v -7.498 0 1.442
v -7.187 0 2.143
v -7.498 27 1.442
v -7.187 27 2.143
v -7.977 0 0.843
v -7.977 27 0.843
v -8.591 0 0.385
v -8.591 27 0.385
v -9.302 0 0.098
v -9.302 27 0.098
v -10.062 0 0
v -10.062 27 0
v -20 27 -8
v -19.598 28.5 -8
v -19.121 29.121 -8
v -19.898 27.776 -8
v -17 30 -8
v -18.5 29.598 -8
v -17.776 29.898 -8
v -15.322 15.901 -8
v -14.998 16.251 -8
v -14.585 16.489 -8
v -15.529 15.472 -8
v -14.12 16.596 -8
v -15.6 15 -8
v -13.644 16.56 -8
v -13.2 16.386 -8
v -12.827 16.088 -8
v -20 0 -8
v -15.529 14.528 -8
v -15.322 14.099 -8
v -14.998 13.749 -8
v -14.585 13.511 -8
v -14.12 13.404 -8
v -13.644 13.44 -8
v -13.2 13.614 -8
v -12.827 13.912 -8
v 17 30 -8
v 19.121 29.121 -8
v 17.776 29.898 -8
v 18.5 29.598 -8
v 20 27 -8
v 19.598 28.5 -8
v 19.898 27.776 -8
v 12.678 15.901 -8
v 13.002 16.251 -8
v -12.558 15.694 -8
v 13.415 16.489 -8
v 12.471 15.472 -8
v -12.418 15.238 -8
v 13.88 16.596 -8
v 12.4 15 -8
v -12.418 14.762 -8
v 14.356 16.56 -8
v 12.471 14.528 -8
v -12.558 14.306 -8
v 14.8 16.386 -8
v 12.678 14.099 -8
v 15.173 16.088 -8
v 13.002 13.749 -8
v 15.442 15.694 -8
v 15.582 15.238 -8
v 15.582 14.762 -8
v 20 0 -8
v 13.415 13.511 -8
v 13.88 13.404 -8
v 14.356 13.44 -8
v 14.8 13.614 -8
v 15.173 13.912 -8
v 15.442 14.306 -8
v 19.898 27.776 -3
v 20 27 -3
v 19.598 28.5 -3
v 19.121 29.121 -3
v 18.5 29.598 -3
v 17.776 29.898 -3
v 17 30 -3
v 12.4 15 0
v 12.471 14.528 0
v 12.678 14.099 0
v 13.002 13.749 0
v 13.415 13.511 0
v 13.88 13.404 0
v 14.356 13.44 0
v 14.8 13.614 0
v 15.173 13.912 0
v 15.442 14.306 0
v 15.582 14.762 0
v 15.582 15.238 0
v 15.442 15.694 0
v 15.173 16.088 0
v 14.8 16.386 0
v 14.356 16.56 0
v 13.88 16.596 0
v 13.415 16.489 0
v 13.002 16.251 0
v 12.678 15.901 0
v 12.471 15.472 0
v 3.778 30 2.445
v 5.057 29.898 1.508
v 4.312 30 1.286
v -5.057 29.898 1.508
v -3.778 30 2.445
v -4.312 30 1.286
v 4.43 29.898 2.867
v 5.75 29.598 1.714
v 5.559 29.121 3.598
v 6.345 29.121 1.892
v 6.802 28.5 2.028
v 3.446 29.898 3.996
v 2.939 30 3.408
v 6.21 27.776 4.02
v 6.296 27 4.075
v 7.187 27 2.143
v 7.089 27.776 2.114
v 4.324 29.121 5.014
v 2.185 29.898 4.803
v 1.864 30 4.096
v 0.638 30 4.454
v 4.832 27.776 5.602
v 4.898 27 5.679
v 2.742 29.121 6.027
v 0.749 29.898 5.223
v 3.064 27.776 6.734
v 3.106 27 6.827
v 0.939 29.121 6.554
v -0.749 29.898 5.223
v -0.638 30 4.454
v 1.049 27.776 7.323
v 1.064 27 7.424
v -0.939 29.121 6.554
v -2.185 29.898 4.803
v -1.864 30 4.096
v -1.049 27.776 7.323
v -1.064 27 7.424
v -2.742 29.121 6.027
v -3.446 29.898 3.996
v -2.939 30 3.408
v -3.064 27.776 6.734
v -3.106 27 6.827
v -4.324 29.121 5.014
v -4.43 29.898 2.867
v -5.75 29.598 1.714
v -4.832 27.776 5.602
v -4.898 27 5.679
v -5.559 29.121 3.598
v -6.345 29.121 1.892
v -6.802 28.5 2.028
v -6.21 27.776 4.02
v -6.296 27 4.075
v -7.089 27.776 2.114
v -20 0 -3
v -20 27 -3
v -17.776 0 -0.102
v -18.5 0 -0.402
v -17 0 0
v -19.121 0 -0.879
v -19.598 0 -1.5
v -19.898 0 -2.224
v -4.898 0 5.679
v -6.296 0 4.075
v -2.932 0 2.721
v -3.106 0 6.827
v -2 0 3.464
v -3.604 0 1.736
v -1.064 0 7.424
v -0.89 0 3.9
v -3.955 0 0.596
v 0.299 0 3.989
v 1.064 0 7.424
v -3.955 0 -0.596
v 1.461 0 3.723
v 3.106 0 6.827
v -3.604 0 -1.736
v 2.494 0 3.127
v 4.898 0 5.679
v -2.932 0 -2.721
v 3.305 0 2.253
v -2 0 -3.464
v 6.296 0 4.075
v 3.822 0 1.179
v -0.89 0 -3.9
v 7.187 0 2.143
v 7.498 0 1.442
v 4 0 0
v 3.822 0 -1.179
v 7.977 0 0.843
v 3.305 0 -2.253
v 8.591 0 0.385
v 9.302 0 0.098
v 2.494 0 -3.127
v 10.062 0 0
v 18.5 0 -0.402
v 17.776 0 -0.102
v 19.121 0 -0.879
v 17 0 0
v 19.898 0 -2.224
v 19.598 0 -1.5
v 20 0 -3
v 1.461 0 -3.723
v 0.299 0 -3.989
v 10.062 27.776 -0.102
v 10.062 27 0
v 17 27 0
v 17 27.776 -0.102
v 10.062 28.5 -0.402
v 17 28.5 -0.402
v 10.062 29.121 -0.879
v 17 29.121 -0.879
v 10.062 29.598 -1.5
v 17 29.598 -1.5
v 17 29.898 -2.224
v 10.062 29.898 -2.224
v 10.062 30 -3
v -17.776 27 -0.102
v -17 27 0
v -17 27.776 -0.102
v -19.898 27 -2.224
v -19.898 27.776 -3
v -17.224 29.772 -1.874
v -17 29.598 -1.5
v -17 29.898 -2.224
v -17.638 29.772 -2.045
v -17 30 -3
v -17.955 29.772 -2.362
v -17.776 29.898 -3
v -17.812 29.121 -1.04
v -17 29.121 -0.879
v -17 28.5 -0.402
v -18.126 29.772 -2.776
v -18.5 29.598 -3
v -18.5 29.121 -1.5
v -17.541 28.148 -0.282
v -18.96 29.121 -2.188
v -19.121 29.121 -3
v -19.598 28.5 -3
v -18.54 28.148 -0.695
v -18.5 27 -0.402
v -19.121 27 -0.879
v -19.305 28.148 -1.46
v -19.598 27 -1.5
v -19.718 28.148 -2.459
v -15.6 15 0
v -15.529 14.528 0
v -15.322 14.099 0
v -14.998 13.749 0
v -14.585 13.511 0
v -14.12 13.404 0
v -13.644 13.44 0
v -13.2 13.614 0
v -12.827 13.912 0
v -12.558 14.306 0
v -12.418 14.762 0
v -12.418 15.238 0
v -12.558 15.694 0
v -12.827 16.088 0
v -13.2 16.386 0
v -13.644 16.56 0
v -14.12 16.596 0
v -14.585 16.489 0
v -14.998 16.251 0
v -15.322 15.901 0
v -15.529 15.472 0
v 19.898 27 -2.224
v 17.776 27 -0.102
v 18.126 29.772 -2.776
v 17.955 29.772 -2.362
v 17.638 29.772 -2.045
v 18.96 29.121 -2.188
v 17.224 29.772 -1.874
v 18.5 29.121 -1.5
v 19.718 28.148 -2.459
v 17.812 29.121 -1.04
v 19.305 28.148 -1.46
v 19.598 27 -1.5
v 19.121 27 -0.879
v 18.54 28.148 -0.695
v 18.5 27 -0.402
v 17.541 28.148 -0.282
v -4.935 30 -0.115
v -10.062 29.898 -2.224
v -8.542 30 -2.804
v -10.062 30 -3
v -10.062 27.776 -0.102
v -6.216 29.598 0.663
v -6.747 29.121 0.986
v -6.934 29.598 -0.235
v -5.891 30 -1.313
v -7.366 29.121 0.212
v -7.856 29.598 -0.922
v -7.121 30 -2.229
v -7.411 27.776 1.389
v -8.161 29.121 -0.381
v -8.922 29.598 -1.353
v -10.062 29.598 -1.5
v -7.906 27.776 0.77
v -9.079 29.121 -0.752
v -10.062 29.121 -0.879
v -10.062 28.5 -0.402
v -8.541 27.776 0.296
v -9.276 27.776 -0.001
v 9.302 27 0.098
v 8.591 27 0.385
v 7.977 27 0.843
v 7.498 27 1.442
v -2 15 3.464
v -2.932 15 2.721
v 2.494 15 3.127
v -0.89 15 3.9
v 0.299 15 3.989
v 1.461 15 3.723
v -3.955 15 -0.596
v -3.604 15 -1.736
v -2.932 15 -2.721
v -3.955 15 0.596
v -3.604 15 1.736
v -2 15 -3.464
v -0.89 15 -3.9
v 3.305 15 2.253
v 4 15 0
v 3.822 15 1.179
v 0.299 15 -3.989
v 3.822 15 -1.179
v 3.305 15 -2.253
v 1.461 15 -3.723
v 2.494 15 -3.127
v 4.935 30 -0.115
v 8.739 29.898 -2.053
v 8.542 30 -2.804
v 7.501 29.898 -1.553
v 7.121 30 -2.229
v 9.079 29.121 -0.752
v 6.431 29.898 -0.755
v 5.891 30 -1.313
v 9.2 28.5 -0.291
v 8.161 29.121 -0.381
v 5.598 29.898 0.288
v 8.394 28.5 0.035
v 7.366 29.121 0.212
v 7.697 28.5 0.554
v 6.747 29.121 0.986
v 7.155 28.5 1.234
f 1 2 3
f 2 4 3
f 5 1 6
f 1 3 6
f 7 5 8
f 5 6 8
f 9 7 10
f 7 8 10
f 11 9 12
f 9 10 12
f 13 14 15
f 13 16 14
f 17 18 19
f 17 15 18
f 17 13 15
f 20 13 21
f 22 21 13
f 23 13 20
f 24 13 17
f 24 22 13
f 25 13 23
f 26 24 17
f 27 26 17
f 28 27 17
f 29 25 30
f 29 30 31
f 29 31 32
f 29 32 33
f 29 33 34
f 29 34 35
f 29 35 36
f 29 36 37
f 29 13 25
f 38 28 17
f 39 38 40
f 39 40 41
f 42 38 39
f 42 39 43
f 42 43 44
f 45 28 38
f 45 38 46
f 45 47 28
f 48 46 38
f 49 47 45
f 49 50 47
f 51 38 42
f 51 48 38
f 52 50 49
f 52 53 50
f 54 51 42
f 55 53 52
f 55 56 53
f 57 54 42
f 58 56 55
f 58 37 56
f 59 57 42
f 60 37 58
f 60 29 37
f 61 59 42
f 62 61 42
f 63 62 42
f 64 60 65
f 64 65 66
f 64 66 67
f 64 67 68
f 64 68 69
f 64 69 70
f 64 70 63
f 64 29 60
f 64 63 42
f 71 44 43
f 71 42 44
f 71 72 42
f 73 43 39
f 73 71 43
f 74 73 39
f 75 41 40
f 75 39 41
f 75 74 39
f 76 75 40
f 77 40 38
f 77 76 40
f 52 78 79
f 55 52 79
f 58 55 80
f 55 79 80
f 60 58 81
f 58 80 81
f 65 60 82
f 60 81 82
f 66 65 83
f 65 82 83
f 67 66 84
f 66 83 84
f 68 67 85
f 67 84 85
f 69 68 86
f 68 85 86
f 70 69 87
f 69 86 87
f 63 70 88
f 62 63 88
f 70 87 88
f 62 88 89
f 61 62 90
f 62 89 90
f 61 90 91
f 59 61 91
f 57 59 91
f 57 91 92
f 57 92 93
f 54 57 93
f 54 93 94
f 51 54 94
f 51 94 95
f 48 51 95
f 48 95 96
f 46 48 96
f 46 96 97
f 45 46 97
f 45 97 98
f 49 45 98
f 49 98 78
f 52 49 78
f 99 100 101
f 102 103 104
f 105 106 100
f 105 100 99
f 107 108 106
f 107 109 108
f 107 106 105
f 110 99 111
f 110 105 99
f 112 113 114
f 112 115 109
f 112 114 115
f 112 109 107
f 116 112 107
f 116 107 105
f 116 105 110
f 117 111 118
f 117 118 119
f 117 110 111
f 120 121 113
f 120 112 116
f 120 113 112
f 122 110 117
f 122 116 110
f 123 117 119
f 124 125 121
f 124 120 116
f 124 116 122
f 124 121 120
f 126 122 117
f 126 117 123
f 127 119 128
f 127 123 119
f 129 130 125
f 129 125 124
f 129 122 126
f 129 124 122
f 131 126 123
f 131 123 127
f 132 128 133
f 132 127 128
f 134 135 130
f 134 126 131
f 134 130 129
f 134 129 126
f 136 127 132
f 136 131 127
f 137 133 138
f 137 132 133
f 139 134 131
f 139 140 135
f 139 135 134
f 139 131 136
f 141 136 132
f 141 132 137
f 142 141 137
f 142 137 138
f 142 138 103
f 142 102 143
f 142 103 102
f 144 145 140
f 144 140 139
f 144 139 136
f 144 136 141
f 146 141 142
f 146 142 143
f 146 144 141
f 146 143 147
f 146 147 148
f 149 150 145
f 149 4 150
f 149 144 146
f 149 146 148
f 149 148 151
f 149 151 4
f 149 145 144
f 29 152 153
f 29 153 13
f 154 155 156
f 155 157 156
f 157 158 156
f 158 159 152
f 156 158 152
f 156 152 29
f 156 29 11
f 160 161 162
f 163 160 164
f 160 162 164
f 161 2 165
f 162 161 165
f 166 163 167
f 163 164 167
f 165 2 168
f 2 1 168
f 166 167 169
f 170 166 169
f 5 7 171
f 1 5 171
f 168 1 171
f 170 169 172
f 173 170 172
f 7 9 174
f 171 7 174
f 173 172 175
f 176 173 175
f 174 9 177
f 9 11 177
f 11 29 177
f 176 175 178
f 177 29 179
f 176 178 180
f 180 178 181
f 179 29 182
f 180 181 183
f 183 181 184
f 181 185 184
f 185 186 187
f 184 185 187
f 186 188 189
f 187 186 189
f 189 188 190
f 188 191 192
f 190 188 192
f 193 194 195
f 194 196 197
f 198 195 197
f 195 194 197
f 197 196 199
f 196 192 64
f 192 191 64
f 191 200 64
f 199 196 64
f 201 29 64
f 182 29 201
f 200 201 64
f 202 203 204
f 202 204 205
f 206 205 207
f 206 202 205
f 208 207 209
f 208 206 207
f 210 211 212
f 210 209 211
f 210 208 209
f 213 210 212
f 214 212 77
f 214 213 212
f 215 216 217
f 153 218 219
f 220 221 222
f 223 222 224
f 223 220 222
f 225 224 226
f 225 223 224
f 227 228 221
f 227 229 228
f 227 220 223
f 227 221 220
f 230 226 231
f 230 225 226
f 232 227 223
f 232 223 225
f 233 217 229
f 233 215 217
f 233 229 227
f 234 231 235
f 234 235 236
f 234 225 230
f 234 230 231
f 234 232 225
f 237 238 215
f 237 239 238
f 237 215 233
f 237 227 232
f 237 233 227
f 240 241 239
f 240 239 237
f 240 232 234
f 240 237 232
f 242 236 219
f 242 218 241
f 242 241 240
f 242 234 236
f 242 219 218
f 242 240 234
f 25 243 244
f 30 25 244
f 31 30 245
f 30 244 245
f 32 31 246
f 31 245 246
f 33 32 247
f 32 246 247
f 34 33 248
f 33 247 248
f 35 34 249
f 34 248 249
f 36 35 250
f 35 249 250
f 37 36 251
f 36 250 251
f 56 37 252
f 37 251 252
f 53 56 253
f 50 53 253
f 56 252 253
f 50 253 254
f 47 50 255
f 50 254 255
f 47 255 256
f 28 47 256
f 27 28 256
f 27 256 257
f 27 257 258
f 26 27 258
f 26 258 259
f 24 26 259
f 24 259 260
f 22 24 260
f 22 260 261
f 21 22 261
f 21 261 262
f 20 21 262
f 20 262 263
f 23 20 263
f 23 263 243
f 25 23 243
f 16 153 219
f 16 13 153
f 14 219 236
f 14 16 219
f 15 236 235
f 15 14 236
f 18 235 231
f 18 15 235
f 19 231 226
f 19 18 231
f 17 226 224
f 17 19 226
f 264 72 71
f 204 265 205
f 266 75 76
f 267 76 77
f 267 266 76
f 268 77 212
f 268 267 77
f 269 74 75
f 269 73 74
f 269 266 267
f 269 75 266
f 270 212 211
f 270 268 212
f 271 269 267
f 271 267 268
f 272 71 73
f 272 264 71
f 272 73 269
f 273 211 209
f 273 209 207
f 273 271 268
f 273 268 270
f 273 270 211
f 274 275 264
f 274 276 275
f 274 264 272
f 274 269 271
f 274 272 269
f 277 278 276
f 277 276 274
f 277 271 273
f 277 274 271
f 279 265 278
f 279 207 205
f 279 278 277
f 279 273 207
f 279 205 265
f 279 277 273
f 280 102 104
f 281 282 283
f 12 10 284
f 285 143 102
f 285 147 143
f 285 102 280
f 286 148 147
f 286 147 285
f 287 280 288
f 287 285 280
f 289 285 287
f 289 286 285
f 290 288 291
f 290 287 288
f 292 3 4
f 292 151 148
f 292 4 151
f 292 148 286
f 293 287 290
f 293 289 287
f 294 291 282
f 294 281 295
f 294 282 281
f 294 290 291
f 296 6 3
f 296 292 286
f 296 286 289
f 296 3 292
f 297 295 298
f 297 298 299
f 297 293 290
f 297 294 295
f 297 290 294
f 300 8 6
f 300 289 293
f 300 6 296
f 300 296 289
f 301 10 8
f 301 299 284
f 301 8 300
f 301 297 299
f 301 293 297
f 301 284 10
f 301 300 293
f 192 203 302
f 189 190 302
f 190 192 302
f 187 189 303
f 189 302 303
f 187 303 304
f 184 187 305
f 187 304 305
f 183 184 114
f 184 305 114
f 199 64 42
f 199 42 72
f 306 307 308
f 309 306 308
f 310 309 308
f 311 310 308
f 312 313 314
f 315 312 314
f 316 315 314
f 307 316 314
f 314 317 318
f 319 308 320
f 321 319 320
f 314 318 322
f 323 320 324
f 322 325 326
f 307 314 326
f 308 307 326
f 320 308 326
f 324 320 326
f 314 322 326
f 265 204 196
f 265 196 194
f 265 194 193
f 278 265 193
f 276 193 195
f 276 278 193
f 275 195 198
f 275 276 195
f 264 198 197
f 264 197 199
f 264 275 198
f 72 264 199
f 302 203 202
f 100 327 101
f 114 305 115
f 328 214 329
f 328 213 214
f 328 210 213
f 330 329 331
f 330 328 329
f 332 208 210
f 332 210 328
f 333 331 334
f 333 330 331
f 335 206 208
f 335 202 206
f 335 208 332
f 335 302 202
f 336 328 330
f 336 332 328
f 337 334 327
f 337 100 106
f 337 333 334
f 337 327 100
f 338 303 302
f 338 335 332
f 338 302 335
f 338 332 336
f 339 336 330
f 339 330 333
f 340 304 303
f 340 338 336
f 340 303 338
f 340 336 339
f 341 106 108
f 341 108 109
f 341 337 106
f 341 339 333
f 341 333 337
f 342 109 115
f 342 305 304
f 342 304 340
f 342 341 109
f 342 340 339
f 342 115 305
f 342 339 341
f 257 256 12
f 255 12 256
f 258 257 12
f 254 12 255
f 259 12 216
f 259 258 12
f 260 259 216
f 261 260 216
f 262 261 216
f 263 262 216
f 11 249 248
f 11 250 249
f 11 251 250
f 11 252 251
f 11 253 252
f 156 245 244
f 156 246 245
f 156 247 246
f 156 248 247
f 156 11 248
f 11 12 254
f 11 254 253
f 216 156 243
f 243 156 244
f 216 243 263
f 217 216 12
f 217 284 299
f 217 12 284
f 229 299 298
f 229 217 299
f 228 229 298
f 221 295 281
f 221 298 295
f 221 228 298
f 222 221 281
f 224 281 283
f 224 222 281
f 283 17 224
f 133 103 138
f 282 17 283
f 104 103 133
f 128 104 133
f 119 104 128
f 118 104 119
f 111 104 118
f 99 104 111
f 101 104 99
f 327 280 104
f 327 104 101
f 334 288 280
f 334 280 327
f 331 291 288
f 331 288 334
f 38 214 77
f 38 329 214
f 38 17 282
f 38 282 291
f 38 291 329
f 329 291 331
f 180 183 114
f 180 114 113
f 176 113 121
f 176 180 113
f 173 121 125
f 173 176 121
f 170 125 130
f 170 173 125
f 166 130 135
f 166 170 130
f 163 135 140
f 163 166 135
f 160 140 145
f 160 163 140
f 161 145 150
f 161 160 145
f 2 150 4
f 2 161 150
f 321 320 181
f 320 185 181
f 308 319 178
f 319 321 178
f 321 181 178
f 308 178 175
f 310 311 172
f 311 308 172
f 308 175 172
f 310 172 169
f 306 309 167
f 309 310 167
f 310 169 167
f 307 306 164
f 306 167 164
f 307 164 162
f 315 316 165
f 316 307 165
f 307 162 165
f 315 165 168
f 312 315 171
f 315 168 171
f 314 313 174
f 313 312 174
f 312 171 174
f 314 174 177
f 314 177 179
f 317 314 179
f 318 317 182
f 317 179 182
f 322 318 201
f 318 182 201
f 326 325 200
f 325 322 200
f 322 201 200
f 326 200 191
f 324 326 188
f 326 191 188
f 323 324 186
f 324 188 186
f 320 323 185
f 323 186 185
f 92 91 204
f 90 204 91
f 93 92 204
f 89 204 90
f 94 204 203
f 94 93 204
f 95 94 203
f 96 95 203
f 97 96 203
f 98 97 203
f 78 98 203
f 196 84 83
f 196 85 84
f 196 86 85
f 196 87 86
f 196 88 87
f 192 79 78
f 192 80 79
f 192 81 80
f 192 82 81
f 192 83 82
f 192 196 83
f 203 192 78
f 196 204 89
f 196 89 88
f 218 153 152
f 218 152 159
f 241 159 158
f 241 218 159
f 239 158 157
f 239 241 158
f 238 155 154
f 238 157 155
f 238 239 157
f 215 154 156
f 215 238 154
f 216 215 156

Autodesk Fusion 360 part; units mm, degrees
sketch "Sketch1" plane through (0, 0, 0) normal (0, 1, 0) x (1, 0, 0)
  line L0 (-7.5, 0) -> (-20, 0)
  line L1 (-20, 0) -> (-20, 8)
  line L2 (-20, 8) -> (20, 8)
  line L3 (20, 8) -> (20, 0)
  line L4 (20, 0) -> (7.5, 0)
  arc A0 (-7.5, 0) -> (7.5, 0) centre (0, 0) ccw
  circle A1 centre (0, 0) radius 4
  dimension "d1" = 15
  dimension "d2" = 20
  dimension "d3" = 20
  dimension "d4" = 8
  dimension "d5" = 8
extrude "Extrude1" add sketch "Sketch1" along normal blind 30 contours L0 L1 L2 L3 L4 A0 | A1
extrude "Extrude2" cut sketch "Sketch1" along normal blind 15 contours A1
fillet "Fillet1" radius 3 4 edges at (-7.5, 15, 0) (7.5, 15, 0) (20, 15, 0) (-20, 15, 0)
sketch "Sketch2" plane through (0, 0, 0) normal (0, 0, 1) x (-1, 0, 0)
  line L0 (-17, 0) -> (-17, -30)
  line L1 (-17, -30) -> (-10.0623, -30)
  line L2 (-10.0623, -30) -> (-10.0623, 0)
  line L3 (-10.0623, 0) -> (-17, 0)
  circle A0 centre (14, -15) radius 1.6
  circle A1 centre (-14, -15) radius 1.6
  line L4 (10.0623, 0) -> (17, 0)
  dimension "d12" = 3.2
  dimension "d13" = 15
  dimension "d14" = 14
  dimension "d15" = 14
extrude "Extrude3" cut sketch "Sketch2" against normal through all contours A0 | A1
fillet "Fillet2" radius 3 9 edges at (-20, 30, -5.5) (-19.1213, 30, -0.8787) (-13.5312, 30, 0) (-8.2695, 30, 0.5946) (0, 30, 7.5) (8.2695, 30, 0.5946) (13.5312, 30, 0) (19.1213, 30, -0.8787) (20, 30, -5.5)
equation "d3 = d2"
equation "d15 = d14"
